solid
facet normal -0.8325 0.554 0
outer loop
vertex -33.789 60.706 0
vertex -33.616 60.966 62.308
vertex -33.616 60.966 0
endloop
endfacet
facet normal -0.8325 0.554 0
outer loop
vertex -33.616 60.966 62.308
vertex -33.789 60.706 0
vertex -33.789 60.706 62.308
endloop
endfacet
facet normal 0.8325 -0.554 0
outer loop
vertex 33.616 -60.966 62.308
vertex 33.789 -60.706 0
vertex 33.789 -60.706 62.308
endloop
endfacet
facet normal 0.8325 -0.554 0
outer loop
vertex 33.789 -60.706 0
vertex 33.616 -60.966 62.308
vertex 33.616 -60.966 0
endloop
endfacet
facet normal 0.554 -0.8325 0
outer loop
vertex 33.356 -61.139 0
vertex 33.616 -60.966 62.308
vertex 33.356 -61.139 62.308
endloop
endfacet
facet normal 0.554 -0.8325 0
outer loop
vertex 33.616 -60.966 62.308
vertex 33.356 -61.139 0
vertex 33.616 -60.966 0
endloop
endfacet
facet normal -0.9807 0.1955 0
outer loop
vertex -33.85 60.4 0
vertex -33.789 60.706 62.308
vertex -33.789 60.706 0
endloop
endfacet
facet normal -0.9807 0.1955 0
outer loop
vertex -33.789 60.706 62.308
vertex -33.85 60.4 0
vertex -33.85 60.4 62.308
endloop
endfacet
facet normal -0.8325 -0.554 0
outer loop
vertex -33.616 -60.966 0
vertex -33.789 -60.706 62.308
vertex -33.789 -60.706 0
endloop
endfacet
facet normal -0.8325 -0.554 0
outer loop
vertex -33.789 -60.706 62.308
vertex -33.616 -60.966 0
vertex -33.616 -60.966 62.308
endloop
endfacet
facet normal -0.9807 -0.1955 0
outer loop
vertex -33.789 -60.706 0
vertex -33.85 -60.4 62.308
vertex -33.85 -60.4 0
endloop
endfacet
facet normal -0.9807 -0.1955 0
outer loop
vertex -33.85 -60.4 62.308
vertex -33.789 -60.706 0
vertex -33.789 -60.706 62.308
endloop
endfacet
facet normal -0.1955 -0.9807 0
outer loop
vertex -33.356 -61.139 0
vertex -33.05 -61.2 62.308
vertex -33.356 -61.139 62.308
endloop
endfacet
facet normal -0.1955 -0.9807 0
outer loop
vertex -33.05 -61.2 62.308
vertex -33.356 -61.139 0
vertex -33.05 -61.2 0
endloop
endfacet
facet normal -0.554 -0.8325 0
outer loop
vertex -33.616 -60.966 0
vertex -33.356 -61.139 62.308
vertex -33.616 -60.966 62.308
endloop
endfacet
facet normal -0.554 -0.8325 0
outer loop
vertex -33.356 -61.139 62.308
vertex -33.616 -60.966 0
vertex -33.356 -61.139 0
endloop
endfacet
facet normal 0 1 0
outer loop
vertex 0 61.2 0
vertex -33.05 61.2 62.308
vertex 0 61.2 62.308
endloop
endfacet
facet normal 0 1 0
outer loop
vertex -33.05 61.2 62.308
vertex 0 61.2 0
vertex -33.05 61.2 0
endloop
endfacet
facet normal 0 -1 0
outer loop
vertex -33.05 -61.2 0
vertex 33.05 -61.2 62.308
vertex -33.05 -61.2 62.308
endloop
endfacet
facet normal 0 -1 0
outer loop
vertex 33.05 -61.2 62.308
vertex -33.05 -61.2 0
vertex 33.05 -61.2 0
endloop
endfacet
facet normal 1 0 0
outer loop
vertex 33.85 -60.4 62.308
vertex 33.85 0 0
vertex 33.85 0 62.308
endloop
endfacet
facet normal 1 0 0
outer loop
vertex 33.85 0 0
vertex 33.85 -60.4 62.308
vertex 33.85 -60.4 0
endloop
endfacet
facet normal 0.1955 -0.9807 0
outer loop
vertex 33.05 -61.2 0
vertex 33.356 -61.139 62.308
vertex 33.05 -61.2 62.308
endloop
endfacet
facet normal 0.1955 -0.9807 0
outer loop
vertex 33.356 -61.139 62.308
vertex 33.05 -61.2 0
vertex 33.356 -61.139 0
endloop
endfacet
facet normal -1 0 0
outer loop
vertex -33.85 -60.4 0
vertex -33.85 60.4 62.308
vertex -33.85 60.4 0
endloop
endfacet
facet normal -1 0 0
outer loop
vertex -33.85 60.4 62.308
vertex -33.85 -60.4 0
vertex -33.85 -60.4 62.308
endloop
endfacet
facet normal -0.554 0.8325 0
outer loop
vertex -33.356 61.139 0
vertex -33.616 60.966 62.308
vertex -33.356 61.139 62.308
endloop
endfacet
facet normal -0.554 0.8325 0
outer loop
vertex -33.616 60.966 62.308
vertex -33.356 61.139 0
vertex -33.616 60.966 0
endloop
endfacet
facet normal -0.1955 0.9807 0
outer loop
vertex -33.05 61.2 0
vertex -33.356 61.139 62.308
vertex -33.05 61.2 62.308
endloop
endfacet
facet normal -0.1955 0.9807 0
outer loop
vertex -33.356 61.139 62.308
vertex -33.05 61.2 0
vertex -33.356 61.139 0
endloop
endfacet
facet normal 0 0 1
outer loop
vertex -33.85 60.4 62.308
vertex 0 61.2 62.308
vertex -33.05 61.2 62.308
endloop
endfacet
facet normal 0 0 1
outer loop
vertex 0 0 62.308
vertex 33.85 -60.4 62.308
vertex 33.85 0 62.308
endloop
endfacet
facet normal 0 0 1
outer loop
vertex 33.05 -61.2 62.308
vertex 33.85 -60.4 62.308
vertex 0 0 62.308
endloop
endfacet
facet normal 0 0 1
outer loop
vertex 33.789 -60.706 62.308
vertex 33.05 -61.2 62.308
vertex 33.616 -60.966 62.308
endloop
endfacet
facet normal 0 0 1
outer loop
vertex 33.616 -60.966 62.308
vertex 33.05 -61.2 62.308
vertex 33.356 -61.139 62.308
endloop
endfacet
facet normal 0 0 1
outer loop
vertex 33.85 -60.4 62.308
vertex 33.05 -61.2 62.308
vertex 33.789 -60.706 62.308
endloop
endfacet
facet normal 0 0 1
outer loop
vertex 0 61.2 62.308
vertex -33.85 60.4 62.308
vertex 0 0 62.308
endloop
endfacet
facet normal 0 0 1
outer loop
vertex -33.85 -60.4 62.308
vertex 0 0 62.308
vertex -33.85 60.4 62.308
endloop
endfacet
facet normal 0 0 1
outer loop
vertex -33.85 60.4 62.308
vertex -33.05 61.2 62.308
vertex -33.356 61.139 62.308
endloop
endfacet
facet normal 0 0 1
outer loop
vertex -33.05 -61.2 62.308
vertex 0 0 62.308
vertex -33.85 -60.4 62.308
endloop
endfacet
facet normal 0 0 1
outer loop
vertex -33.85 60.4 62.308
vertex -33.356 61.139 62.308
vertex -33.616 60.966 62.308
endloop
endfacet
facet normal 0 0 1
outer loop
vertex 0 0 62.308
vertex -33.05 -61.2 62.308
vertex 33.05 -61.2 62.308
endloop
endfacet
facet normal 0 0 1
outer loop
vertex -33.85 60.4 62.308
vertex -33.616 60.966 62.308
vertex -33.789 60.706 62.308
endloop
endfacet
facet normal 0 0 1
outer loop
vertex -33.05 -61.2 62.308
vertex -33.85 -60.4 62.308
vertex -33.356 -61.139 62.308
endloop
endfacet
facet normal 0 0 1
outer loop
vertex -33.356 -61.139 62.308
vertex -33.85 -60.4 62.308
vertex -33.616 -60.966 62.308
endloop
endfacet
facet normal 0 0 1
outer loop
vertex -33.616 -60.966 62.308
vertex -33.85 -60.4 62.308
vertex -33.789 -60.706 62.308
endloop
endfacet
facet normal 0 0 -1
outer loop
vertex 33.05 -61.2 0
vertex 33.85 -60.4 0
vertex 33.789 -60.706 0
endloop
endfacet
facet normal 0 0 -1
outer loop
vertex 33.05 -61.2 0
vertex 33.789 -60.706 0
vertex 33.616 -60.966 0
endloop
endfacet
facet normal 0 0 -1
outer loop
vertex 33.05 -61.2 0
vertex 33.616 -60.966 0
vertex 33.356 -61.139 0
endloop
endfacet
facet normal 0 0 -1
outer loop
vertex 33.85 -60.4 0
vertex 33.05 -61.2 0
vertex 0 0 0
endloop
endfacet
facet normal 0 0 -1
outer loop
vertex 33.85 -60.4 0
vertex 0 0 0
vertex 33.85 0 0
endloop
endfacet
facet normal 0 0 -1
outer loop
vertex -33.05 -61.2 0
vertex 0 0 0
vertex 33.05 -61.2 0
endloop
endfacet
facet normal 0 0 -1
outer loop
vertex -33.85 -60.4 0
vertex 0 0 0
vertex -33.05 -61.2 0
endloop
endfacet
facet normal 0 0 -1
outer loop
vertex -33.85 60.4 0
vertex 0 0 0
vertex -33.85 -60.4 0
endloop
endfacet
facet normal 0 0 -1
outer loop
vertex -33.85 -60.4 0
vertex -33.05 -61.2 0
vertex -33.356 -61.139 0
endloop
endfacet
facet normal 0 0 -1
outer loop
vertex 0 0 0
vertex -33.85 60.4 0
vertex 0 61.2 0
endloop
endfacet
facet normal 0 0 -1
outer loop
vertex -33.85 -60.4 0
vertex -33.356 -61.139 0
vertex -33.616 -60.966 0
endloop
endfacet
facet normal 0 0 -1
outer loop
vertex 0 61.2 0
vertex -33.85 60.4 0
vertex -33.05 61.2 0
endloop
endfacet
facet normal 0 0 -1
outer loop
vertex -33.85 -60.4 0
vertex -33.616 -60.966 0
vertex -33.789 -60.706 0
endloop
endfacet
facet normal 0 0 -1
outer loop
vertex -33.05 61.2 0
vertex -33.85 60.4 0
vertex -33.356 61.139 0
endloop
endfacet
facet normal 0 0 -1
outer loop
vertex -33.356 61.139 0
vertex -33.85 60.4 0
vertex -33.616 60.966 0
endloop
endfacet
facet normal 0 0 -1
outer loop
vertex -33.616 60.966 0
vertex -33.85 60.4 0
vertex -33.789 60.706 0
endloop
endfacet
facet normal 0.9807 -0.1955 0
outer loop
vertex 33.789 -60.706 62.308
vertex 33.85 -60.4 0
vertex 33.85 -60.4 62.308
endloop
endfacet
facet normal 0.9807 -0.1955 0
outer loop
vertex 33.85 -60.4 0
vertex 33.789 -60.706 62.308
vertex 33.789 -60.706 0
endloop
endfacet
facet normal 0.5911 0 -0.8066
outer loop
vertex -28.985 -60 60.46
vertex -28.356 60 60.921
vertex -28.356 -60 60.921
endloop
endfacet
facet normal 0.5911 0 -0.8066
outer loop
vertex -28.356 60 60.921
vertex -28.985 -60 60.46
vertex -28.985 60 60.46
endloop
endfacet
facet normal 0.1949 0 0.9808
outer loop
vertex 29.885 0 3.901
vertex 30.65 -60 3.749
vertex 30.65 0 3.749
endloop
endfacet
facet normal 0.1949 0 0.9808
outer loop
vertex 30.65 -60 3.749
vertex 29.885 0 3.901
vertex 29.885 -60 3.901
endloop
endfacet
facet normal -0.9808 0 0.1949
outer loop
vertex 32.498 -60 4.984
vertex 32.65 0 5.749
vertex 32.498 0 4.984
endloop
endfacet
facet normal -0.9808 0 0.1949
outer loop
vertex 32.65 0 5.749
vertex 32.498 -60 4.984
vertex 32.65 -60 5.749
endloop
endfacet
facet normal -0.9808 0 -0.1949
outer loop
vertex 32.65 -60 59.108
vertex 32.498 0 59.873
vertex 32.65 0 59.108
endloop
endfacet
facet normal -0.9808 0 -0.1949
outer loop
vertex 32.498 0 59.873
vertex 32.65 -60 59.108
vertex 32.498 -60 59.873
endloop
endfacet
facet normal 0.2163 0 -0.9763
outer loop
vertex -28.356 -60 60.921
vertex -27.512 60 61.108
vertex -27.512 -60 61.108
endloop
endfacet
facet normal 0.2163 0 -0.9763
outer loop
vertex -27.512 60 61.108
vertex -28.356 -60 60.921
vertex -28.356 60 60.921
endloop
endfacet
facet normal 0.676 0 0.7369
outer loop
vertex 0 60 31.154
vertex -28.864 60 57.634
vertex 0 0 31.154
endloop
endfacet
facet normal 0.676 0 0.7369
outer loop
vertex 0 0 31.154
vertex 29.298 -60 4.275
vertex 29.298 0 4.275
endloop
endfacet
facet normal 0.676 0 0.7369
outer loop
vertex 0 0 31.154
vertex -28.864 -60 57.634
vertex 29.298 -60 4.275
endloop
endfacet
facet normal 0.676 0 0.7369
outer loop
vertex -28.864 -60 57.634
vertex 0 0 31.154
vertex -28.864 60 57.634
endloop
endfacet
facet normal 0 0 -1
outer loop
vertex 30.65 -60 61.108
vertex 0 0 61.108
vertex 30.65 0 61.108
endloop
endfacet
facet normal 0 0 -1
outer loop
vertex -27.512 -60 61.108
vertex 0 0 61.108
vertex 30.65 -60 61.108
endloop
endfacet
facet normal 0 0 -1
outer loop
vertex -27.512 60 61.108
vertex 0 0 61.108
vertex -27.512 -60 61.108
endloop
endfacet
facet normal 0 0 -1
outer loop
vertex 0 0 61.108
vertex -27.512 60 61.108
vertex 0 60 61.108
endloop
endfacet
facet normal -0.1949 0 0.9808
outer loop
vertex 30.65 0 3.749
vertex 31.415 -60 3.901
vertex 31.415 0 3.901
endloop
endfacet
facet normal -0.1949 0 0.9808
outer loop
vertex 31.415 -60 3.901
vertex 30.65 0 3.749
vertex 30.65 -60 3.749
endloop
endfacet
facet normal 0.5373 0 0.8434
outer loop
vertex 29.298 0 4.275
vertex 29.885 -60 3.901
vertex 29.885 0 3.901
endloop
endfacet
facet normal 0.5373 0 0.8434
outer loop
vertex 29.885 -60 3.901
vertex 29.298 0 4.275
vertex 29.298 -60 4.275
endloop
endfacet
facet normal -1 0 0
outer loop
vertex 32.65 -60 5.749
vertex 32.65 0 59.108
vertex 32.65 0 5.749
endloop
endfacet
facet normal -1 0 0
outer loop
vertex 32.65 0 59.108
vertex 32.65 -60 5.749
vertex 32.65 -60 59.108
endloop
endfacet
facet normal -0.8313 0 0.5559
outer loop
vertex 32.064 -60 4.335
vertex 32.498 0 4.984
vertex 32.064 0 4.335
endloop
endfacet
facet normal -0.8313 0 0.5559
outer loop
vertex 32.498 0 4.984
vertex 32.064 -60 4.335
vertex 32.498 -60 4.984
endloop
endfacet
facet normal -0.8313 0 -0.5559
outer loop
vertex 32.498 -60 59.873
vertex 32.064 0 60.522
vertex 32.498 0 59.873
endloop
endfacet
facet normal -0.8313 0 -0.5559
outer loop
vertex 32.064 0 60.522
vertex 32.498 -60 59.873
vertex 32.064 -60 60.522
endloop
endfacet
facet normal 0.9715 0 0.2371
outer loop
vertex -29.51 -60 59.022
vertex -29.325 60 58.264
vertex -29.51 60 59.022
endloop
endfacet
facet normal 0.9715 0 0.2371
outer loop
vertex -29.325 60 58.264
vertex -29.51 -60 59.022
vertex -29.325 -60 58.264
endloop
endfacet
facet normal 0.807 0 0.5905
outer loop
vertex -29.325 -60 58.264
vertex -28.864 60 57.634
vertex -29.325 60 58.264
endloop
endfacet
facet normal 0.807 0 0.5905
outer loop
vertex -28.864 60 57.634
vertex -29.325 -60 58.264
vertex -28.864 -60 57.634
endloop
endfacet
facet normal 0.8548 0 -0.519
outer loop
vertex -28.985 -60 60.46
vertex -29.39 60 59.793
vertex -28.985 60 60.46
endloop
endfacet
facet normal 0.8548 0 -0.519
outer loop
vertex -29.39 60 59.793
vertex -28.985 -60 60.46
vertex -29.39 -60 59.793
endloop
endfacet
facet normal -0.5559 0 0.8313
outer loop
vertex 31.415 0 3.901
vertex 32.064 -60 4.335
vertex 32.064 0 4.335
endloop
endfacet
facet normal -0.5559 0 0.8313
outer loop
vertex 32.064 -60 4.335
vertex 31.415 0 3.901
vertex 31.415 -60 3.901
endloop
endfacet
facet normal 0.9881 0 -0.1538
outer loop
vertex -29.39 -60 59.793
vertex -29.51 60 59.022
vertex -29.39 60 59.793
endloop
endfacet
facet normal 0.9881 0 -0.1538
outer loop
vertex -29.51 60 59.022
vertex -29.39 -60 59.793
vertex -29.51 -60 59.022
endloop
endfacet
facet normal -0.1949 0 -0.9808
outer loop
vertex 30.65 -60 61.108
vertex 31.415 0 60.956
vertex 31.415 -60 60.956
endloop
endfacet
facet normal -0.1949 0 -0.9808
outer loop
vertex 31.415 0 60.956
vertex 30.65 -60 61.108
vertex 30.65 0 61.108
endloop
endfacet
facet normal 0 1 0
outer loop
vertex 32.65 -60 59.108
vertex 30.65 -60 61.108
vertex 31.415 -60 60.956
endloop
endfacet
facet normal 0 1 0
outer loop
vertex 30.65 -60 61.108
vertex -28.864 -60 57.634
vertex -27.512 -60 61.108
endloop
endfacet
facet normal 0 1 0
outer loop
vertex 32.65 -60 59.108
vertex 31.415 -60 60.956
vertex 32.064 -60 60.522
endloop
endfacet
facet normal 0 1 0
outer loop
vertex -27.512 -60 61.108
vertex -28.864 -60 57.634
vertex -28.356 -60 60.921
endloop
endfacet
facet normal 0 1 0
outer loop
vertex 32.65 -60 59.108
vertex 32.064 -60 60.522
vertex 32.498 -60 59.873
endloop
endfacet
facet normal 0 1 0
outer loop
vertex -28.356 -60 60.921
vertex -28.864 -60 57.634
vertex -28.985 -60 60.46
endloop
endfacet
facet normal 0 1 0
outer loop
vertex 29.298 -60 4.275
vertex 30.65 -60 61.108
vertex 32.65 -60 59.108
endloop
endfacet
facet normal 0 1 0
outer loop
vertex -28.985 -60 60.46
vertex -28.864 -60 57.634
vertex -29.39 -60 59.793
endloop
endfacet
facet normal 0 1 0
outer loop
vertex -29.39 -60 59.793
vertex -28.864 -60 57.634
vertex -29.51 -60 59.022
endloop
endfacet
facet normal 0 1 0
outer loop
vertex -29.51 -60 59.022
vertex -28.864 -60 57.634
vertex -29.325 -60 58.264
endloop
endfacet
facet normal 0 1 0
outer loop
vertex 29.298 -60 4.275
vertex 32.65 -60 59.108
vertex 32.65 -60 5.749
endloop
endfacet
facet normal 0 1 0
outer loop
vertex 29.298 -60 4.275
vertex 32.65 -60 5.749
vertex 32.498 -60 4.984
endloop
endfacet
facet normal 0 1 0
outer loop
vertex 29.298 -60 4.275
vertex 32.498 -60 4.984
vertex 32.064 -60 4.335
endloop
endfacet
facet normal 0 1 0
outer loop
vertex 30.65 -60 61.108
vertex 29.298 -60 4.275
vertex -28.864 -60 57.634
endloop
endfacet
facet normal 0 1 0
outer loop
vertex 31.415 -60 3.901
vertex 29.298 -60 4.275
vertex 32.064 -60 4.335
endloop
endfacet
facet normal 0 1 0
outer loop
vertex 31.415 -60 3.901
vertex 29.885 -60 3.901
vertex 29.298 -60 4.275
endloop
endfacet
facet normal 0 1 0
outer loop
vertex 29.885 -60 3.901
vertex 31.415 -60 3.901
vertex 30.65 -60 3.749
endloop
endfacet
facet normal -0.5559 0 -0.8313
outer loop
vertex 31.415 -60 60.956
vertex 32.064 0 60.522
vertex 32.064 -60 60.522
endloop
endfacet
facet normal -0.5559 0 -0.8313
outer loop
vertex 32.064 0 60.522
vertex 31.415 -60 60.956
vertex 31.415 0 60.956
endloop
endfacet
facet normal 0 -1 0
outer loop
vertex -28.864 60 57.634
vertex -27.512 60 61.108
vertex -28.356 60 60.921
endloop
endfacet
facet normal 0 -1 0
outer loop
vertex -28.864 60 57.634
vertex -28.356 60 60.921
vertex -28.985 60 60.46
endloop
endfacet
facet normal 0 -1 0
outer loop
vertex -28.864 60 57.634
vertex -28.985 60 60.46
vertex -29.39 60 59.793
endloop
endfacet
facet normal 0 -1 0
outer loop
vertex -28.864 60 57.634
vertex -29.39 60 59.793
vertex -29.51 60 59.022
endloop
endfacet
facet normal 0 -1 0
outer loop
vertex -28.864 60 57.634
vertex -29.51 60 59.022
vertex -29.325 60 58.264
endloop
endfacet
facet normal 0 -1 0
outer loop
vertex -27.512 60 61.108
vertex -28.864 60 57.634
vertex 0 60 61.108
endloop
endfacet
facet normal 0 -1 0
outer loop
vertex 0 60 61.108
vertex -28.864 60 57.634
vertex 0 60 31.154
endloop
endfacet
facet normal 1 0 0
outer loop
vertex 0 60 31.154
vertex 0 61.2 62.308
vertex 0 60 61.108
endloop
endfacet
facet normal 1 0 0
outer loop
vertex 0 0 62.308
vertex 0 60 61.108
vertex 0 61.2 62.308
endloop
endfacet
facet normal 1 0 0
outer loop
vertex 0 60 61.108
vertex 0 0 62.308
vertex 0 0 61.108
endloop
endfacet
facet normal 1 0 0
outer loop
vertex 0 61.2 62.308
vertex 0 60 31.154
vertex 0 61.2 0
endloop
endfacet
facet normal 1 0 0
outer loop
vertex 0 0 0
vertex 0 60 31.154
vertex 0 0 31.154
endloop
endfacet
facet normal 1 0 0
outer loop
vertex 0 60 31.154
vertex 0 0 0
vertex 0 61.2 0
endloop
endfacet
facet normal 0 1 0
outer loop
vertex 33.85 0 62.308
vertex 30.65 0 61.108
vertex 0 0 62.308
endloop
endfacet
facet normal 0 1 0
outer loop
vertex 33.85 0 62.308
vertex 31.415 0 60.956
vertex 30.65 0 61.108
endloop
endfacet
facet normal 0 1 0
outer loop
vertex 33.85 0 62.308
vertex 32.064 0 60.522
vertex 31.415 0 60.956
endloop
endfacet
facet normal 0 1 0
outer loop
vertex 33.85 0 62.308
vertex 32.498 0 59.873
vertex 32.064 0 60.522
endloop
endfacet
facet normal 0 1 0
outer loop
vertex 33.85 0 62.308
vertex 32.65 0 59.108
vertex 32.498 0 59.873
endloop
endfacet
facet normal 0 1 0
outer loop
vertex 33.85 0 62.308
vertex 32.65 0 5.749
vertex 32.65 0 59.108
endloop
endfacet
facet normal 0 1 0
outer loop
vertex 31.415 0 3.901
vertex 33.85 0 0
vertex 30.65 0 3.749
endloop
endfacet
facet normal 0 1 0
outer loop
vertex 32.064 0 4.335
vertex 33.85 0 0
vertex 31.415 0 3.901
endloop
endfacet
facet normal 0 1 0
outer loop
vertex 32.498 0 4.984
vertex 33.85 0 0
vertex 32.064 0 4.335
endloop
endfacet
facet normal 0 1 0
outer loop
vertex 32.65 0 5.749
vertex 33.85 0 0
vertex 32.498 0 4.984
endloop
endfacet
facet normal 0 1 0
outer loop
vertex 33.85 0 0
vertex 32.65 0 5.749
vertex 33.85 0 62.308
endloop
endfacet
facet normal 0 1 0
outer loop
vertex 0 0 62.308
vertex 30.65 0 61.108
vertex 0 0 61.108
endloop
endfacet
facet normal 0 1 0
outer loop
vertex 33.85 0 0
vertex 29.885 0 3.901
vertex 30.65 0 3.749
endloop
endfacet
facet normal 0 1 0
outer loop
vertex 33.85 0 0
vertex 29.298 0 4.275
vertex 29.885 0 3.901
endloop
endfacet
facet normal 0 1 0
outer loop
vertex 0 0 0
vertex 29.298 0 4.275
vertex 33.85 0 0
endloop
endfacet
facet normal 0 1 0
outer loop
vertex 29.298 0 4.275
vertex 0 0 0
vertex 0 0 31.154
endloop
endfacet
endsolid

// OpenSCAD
// Toothpick Holder/Dispenser
// Created out of necessity; everything online is gimmicky
// and overcomplicated. Just gimme a box, please!

$fn=16;

toothpick_len = 65.0;
toothpick_dia = 1.9;
tolerance = 0.3;

inner_rounding = 2.0;
box_needed_volume = 2*120.0*(toothpick_len+0.2)*30.0; // 2x bc tria
box_inner_len = toothpick_len+tolerance;
box_inner_wid = 120.0;
box_inner_h = (box_needed_volume/box_inner_wid)/box_inner_len;
wall_thick = 1.2;

outer_rounding = 0.8;
box_outer_len = box_inner_len + wall_thick*2;
box_outer_wid = box_inner_wid + wall_thick*2;
box_outer_h = box_inner_h + wall_thick*2;

module boxWedgeHole() {
    rotate([180,90,-90]) 
    translate([-box_inner_h-wall_thick,-box_inner_len/2,-box_inner_wid/2])
    linear_extrude(box_inner_wid, convexity=6)
    offset(inner_rounding) offset(-inner_rounding)
    offset(-inner_rounding) offset(inner_rounding)
    polygon([[0, 0], [0, box_inner_len], [box_inner_h, 0]]);
}

module boxBody() {
    linear_extrude(box_outer_h, convexity=6)
    offset(outer_rounding) offset(-outer_rounding)
    square([box_outer_len, box_outer_wid], center=true);
}

module boxComplete() {
    difference() {
        boxBody();
        boxWedgeHole();
    }
}

difference() {
boxComplete();
cube(200);
}
